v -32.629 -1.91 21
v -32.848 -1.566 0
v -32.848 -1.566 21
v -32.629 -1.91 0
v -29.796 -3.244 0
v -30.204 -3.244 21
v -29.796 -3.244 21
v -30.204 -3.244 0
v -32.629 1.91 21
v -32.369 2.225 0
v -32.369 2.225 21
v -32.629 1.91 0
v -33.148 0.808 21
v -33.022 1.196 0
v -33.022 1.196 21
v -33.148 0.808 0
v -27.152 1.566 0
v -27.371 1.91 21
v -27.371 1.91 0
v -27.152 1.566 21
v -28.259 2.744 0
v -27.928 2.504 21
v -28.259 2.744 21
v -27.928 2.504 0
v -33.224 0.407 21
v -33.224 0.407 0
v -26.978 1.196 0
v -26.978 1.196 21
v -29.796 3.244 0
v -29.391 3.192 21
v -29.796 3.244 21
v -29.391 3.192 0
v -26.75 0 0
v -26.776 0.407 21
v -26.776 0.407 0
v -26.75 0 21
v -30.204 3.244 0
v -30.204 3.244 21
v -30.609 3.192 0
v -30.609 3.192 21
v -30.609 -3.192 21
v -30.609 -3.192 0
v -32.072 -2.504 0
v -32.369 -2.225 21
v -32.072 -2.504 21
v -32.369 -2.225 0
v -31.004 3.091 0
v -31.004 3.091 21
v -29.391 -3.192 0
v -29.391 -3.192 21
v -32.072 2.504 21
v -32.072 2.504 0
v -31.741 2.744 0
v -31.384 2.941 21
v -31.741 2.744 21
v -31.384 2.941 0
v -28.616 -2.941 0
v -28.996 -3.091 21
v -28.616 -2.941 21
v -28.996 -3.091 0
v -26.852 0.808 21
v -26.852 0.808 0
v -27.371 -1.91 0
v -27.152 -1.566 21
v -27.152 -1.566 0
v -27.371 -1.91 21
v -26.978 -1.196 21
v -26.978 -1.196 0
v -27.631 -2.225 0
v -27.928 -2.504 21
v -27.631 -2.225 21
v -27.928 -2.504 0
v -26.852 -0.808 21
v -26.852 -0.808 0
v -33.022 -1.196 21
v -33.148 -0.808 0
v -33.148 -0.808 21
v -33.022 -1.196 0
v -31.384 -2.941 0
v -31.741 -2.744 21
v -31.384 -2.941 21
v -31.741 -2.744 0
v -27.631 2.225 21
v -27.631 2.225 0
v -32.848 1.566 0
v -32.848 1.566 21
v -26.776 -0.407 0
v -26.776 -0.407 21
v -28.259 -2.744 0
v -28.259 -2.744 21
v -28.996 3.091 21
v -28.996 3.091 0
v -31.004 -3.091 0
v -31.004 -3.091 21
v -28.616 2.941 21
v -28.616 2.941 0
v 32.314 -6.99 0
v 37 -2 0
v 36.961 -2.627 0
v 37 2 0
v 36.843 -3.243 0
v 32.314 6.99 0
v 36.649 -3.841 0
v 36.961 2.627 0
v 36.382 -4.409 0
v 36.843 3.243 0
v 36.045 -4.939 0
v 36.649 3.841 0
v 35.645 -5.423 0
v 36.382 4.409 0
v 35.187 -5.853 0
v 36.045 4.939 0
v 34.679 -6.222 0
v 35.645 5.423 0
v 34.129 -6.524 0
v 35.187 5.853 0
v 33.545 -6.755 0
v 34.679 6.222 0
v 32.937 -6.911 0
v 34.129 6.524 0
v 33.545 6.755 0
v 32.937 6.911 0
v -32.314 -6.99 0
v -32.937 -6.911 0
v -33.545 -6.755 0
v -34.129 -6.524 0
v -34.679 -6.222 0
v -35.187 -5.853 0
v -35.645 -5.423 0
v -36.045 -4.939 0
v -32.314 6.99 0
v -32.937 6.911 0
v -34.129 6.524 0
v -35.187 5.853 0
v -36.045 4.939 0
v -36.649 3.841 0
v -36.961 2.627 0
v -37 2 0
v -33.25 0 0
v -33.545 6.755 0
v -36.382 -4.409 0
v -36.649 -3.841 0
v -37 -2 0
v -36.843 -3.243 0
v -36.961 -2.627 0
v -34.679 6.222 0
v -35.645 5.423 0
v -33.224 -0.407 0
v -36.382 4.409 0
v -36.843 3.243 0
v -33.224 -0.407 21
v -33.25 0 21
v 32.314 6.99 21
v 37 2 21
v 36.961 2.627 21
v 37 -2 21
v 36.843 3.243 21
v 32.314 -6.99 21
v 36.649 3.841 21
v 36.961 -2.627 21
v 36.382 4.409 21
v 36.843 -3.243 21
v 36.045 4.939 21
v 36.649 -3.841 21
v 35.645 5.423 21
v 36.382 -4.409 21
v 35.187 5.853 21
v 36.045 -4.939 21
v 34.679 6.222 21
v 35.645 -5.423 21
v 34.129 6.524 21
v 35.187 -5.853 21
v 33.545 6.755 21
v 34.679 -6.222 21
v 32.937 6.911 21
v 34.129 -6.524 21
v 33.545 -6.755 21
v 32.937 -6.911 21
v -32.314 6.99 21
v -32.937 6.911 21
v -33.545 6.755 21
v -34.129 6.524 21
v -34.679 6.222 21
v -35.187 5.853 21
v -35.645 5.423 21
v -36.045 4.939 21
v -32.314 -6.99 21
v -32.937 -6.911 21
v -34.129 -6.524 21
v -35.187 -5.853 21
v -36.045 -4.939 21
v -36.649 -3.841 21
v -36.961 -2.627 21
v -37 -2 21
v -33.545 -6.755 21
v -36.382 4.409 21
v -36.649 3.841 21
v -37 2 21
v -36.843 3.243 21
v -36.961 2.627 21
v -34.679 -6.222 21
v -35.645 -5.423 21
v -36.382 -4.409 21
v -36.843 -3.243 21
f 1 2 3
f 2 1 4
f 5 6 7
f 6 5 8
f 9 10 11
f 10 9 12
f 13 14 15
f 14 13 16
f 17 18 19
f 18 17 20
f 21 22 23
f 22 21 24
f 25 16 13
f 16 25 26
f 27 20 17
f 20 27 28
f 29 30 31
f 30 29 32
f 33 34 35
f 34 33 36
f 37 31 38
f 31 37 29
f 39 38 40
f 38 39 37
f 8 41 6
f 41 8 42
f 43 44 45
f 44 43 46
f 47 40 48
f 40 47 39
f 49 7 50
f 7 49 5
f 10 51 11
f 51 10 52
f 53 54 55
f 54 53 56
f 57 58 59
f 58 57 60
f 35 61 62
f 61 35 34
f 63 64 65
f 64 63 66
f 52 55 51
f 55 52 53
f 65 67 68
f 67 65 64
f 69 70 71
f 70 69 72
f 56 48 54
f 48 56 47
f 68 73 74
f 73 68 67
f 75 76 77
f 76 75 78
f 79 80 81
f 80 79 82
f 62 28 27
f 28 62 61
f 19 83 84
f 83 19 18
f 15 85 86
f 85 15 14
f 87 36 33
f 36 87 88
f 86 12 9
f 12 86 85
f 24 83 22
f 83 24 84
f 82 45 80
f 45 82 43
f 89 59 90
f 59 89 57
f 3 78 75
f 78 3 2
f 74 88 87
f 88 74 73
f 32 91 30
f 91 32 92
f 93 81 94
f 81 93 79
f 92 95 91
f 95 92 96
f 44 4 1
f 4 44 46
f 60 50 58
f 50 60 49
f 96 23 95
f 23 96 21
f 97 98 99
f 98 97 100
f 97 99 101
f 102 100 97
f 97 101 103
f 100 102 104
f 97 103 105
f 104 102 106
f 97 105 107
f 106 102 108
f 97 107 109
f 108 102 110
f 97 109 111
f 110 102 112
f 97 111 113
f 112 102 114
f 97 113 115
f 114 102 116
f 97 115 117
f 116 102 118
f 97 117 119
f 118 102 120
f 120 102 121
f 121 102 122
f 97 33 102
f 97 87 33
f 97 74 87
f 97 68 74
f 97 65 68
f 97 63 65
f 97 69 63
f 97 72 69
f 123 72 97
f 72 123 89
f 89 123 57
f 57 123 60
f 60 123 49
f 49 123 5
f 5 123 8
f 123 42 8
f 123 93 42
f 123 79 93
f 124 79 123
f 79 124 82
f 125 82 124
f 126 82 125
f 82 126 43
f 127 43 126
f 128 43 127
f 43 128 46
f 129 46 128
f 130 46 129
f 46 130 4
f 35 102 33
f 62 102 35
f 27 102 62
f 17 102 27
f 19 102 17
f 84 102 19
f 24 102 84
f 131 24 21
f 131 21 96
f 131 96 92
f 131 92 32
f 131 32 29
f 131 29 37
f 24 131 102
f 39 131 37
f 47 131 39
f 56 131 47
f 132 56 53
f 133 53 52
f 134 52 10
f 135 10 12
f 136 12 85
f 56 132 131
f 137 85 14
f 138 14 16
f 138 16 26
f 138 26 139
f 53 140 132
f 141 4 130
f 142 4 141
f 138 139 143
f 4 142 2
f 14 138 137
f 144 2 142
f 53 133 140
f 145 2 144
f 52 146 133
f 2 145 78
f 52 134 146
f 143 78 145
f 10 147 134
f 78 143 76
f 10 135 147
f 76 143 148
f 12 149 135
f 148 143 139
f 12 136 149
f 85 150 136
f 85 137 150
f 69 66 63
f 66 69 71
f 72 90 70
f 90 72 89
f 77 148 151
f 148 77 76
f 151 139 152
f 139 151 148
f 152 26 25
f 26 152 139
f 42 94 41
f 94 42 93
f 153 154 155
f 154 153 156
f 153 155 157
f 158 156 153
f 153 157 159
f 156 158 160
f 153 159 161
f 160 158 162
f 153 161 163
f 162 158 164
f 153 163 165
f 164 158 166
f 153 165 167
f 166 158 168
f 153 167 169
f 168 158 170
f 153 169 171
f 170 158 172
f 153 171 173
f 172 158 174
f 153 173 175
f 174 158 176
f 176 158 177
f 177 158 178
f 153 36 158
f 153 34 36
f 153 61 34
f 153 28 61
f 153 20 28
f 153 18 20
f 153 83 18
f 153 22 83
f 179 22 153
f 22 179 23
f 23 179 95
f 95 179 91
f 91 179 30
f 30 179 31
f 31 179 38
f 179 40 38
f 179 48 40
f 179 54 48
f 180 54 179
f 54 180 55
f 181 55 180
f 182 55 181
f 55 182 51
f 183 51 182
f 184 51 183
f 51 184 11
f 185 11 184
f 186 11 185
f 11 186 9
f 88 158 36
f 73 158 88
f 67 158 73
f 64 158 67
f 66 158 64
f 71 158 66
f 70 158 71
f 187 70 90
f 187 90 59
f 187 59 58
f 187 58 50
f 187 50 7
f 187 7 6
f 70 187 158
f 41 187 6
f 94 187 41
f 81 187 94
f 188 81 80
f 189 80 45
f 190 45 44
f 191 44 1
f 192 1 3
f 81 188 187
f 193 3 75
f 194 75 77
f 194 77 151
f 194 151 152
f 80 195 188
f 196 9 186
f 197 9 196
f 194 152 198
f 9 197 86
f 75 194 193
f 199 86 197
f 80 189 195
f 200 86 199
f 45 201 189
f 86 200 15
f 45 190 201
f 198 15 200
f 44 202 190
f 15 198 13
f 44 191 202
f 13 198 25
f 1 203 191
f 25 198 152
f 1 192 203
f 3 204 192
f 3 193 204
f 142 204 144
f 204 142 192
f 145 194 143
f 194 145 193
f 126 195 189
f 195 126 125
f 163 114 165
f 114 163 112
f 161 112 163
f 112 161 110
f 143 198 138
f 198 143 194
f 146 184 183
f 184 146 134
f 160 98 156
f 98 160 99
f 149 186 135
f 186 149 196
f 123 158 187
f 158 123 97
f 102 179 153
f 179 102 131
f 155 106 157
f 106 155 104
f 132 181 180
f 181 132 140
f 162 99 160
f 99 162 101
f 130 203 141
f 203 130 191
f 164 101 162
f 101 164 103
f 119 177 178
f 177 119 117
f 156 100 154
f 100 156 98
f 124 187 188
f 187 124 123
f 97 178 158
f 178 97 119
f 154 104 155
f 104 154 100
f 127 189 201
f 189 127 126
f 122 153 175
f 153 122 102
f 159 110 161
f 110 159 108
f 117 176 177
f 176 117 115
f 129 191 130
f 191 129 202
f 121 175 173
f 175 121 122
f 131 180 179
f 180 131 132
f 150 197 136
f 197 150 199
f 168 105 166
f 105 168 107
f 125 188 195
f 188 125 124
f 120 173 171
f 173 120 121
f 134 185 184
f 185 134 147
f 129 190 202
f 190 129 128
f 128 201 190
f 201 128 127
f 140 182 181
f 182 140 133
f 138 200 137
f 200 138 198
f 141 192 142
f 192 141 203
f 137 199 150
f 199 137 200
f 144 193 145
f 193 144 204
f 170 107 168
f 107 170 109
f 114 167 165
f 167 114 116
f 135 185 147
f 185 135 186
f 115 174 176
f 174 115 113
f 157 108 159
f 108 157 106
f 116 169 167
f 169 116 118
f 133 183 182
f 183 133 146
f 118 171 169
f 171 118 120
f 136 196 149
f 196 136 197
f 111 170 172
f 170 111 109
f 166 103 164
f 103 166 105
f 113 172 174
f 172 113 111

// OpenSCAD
$fn = 50;


difference() {
	union() {
		hull() {
			translate(v = [-32.0000000000, 2.0000000000, 0]) {
				cylinder(h = 21, r = 5);
			}
			translate(v = [32.0000000000, 2.0000000000, 0]) {
				cylinder(h = 21, r = 5);
			}
			translate(v = [-32.0000000000, -2.0000000000, 0]) {
				cylinder(h = 21, r = 5);
			}
			translate(v = [32.0000000000, -2.0000000000, 0]) {
				cylinder(h = 21, r = 5);
			}
		}
	}
	union() {
		translate(v = [-30.0000000000, 0.0000000000, 0]) {
			cylinder(h = 21, r = 3.2500000000);
		}
		translate(v = [-30.0000000000, 0.0000000000, 0]) {
			cylinder(h = 21, r = 1.8000000000);
		}
		translate(v = [-30.0000000000, 0.0000000000, 0]) {
			cylinder(h = 21, r = 1.8000000000);
		}
		translate(v = [-30.0000000000, 0.0000000000, 0]) {
			cylinder(h = 21, r = 1.8000000000);
		}
	}
}
